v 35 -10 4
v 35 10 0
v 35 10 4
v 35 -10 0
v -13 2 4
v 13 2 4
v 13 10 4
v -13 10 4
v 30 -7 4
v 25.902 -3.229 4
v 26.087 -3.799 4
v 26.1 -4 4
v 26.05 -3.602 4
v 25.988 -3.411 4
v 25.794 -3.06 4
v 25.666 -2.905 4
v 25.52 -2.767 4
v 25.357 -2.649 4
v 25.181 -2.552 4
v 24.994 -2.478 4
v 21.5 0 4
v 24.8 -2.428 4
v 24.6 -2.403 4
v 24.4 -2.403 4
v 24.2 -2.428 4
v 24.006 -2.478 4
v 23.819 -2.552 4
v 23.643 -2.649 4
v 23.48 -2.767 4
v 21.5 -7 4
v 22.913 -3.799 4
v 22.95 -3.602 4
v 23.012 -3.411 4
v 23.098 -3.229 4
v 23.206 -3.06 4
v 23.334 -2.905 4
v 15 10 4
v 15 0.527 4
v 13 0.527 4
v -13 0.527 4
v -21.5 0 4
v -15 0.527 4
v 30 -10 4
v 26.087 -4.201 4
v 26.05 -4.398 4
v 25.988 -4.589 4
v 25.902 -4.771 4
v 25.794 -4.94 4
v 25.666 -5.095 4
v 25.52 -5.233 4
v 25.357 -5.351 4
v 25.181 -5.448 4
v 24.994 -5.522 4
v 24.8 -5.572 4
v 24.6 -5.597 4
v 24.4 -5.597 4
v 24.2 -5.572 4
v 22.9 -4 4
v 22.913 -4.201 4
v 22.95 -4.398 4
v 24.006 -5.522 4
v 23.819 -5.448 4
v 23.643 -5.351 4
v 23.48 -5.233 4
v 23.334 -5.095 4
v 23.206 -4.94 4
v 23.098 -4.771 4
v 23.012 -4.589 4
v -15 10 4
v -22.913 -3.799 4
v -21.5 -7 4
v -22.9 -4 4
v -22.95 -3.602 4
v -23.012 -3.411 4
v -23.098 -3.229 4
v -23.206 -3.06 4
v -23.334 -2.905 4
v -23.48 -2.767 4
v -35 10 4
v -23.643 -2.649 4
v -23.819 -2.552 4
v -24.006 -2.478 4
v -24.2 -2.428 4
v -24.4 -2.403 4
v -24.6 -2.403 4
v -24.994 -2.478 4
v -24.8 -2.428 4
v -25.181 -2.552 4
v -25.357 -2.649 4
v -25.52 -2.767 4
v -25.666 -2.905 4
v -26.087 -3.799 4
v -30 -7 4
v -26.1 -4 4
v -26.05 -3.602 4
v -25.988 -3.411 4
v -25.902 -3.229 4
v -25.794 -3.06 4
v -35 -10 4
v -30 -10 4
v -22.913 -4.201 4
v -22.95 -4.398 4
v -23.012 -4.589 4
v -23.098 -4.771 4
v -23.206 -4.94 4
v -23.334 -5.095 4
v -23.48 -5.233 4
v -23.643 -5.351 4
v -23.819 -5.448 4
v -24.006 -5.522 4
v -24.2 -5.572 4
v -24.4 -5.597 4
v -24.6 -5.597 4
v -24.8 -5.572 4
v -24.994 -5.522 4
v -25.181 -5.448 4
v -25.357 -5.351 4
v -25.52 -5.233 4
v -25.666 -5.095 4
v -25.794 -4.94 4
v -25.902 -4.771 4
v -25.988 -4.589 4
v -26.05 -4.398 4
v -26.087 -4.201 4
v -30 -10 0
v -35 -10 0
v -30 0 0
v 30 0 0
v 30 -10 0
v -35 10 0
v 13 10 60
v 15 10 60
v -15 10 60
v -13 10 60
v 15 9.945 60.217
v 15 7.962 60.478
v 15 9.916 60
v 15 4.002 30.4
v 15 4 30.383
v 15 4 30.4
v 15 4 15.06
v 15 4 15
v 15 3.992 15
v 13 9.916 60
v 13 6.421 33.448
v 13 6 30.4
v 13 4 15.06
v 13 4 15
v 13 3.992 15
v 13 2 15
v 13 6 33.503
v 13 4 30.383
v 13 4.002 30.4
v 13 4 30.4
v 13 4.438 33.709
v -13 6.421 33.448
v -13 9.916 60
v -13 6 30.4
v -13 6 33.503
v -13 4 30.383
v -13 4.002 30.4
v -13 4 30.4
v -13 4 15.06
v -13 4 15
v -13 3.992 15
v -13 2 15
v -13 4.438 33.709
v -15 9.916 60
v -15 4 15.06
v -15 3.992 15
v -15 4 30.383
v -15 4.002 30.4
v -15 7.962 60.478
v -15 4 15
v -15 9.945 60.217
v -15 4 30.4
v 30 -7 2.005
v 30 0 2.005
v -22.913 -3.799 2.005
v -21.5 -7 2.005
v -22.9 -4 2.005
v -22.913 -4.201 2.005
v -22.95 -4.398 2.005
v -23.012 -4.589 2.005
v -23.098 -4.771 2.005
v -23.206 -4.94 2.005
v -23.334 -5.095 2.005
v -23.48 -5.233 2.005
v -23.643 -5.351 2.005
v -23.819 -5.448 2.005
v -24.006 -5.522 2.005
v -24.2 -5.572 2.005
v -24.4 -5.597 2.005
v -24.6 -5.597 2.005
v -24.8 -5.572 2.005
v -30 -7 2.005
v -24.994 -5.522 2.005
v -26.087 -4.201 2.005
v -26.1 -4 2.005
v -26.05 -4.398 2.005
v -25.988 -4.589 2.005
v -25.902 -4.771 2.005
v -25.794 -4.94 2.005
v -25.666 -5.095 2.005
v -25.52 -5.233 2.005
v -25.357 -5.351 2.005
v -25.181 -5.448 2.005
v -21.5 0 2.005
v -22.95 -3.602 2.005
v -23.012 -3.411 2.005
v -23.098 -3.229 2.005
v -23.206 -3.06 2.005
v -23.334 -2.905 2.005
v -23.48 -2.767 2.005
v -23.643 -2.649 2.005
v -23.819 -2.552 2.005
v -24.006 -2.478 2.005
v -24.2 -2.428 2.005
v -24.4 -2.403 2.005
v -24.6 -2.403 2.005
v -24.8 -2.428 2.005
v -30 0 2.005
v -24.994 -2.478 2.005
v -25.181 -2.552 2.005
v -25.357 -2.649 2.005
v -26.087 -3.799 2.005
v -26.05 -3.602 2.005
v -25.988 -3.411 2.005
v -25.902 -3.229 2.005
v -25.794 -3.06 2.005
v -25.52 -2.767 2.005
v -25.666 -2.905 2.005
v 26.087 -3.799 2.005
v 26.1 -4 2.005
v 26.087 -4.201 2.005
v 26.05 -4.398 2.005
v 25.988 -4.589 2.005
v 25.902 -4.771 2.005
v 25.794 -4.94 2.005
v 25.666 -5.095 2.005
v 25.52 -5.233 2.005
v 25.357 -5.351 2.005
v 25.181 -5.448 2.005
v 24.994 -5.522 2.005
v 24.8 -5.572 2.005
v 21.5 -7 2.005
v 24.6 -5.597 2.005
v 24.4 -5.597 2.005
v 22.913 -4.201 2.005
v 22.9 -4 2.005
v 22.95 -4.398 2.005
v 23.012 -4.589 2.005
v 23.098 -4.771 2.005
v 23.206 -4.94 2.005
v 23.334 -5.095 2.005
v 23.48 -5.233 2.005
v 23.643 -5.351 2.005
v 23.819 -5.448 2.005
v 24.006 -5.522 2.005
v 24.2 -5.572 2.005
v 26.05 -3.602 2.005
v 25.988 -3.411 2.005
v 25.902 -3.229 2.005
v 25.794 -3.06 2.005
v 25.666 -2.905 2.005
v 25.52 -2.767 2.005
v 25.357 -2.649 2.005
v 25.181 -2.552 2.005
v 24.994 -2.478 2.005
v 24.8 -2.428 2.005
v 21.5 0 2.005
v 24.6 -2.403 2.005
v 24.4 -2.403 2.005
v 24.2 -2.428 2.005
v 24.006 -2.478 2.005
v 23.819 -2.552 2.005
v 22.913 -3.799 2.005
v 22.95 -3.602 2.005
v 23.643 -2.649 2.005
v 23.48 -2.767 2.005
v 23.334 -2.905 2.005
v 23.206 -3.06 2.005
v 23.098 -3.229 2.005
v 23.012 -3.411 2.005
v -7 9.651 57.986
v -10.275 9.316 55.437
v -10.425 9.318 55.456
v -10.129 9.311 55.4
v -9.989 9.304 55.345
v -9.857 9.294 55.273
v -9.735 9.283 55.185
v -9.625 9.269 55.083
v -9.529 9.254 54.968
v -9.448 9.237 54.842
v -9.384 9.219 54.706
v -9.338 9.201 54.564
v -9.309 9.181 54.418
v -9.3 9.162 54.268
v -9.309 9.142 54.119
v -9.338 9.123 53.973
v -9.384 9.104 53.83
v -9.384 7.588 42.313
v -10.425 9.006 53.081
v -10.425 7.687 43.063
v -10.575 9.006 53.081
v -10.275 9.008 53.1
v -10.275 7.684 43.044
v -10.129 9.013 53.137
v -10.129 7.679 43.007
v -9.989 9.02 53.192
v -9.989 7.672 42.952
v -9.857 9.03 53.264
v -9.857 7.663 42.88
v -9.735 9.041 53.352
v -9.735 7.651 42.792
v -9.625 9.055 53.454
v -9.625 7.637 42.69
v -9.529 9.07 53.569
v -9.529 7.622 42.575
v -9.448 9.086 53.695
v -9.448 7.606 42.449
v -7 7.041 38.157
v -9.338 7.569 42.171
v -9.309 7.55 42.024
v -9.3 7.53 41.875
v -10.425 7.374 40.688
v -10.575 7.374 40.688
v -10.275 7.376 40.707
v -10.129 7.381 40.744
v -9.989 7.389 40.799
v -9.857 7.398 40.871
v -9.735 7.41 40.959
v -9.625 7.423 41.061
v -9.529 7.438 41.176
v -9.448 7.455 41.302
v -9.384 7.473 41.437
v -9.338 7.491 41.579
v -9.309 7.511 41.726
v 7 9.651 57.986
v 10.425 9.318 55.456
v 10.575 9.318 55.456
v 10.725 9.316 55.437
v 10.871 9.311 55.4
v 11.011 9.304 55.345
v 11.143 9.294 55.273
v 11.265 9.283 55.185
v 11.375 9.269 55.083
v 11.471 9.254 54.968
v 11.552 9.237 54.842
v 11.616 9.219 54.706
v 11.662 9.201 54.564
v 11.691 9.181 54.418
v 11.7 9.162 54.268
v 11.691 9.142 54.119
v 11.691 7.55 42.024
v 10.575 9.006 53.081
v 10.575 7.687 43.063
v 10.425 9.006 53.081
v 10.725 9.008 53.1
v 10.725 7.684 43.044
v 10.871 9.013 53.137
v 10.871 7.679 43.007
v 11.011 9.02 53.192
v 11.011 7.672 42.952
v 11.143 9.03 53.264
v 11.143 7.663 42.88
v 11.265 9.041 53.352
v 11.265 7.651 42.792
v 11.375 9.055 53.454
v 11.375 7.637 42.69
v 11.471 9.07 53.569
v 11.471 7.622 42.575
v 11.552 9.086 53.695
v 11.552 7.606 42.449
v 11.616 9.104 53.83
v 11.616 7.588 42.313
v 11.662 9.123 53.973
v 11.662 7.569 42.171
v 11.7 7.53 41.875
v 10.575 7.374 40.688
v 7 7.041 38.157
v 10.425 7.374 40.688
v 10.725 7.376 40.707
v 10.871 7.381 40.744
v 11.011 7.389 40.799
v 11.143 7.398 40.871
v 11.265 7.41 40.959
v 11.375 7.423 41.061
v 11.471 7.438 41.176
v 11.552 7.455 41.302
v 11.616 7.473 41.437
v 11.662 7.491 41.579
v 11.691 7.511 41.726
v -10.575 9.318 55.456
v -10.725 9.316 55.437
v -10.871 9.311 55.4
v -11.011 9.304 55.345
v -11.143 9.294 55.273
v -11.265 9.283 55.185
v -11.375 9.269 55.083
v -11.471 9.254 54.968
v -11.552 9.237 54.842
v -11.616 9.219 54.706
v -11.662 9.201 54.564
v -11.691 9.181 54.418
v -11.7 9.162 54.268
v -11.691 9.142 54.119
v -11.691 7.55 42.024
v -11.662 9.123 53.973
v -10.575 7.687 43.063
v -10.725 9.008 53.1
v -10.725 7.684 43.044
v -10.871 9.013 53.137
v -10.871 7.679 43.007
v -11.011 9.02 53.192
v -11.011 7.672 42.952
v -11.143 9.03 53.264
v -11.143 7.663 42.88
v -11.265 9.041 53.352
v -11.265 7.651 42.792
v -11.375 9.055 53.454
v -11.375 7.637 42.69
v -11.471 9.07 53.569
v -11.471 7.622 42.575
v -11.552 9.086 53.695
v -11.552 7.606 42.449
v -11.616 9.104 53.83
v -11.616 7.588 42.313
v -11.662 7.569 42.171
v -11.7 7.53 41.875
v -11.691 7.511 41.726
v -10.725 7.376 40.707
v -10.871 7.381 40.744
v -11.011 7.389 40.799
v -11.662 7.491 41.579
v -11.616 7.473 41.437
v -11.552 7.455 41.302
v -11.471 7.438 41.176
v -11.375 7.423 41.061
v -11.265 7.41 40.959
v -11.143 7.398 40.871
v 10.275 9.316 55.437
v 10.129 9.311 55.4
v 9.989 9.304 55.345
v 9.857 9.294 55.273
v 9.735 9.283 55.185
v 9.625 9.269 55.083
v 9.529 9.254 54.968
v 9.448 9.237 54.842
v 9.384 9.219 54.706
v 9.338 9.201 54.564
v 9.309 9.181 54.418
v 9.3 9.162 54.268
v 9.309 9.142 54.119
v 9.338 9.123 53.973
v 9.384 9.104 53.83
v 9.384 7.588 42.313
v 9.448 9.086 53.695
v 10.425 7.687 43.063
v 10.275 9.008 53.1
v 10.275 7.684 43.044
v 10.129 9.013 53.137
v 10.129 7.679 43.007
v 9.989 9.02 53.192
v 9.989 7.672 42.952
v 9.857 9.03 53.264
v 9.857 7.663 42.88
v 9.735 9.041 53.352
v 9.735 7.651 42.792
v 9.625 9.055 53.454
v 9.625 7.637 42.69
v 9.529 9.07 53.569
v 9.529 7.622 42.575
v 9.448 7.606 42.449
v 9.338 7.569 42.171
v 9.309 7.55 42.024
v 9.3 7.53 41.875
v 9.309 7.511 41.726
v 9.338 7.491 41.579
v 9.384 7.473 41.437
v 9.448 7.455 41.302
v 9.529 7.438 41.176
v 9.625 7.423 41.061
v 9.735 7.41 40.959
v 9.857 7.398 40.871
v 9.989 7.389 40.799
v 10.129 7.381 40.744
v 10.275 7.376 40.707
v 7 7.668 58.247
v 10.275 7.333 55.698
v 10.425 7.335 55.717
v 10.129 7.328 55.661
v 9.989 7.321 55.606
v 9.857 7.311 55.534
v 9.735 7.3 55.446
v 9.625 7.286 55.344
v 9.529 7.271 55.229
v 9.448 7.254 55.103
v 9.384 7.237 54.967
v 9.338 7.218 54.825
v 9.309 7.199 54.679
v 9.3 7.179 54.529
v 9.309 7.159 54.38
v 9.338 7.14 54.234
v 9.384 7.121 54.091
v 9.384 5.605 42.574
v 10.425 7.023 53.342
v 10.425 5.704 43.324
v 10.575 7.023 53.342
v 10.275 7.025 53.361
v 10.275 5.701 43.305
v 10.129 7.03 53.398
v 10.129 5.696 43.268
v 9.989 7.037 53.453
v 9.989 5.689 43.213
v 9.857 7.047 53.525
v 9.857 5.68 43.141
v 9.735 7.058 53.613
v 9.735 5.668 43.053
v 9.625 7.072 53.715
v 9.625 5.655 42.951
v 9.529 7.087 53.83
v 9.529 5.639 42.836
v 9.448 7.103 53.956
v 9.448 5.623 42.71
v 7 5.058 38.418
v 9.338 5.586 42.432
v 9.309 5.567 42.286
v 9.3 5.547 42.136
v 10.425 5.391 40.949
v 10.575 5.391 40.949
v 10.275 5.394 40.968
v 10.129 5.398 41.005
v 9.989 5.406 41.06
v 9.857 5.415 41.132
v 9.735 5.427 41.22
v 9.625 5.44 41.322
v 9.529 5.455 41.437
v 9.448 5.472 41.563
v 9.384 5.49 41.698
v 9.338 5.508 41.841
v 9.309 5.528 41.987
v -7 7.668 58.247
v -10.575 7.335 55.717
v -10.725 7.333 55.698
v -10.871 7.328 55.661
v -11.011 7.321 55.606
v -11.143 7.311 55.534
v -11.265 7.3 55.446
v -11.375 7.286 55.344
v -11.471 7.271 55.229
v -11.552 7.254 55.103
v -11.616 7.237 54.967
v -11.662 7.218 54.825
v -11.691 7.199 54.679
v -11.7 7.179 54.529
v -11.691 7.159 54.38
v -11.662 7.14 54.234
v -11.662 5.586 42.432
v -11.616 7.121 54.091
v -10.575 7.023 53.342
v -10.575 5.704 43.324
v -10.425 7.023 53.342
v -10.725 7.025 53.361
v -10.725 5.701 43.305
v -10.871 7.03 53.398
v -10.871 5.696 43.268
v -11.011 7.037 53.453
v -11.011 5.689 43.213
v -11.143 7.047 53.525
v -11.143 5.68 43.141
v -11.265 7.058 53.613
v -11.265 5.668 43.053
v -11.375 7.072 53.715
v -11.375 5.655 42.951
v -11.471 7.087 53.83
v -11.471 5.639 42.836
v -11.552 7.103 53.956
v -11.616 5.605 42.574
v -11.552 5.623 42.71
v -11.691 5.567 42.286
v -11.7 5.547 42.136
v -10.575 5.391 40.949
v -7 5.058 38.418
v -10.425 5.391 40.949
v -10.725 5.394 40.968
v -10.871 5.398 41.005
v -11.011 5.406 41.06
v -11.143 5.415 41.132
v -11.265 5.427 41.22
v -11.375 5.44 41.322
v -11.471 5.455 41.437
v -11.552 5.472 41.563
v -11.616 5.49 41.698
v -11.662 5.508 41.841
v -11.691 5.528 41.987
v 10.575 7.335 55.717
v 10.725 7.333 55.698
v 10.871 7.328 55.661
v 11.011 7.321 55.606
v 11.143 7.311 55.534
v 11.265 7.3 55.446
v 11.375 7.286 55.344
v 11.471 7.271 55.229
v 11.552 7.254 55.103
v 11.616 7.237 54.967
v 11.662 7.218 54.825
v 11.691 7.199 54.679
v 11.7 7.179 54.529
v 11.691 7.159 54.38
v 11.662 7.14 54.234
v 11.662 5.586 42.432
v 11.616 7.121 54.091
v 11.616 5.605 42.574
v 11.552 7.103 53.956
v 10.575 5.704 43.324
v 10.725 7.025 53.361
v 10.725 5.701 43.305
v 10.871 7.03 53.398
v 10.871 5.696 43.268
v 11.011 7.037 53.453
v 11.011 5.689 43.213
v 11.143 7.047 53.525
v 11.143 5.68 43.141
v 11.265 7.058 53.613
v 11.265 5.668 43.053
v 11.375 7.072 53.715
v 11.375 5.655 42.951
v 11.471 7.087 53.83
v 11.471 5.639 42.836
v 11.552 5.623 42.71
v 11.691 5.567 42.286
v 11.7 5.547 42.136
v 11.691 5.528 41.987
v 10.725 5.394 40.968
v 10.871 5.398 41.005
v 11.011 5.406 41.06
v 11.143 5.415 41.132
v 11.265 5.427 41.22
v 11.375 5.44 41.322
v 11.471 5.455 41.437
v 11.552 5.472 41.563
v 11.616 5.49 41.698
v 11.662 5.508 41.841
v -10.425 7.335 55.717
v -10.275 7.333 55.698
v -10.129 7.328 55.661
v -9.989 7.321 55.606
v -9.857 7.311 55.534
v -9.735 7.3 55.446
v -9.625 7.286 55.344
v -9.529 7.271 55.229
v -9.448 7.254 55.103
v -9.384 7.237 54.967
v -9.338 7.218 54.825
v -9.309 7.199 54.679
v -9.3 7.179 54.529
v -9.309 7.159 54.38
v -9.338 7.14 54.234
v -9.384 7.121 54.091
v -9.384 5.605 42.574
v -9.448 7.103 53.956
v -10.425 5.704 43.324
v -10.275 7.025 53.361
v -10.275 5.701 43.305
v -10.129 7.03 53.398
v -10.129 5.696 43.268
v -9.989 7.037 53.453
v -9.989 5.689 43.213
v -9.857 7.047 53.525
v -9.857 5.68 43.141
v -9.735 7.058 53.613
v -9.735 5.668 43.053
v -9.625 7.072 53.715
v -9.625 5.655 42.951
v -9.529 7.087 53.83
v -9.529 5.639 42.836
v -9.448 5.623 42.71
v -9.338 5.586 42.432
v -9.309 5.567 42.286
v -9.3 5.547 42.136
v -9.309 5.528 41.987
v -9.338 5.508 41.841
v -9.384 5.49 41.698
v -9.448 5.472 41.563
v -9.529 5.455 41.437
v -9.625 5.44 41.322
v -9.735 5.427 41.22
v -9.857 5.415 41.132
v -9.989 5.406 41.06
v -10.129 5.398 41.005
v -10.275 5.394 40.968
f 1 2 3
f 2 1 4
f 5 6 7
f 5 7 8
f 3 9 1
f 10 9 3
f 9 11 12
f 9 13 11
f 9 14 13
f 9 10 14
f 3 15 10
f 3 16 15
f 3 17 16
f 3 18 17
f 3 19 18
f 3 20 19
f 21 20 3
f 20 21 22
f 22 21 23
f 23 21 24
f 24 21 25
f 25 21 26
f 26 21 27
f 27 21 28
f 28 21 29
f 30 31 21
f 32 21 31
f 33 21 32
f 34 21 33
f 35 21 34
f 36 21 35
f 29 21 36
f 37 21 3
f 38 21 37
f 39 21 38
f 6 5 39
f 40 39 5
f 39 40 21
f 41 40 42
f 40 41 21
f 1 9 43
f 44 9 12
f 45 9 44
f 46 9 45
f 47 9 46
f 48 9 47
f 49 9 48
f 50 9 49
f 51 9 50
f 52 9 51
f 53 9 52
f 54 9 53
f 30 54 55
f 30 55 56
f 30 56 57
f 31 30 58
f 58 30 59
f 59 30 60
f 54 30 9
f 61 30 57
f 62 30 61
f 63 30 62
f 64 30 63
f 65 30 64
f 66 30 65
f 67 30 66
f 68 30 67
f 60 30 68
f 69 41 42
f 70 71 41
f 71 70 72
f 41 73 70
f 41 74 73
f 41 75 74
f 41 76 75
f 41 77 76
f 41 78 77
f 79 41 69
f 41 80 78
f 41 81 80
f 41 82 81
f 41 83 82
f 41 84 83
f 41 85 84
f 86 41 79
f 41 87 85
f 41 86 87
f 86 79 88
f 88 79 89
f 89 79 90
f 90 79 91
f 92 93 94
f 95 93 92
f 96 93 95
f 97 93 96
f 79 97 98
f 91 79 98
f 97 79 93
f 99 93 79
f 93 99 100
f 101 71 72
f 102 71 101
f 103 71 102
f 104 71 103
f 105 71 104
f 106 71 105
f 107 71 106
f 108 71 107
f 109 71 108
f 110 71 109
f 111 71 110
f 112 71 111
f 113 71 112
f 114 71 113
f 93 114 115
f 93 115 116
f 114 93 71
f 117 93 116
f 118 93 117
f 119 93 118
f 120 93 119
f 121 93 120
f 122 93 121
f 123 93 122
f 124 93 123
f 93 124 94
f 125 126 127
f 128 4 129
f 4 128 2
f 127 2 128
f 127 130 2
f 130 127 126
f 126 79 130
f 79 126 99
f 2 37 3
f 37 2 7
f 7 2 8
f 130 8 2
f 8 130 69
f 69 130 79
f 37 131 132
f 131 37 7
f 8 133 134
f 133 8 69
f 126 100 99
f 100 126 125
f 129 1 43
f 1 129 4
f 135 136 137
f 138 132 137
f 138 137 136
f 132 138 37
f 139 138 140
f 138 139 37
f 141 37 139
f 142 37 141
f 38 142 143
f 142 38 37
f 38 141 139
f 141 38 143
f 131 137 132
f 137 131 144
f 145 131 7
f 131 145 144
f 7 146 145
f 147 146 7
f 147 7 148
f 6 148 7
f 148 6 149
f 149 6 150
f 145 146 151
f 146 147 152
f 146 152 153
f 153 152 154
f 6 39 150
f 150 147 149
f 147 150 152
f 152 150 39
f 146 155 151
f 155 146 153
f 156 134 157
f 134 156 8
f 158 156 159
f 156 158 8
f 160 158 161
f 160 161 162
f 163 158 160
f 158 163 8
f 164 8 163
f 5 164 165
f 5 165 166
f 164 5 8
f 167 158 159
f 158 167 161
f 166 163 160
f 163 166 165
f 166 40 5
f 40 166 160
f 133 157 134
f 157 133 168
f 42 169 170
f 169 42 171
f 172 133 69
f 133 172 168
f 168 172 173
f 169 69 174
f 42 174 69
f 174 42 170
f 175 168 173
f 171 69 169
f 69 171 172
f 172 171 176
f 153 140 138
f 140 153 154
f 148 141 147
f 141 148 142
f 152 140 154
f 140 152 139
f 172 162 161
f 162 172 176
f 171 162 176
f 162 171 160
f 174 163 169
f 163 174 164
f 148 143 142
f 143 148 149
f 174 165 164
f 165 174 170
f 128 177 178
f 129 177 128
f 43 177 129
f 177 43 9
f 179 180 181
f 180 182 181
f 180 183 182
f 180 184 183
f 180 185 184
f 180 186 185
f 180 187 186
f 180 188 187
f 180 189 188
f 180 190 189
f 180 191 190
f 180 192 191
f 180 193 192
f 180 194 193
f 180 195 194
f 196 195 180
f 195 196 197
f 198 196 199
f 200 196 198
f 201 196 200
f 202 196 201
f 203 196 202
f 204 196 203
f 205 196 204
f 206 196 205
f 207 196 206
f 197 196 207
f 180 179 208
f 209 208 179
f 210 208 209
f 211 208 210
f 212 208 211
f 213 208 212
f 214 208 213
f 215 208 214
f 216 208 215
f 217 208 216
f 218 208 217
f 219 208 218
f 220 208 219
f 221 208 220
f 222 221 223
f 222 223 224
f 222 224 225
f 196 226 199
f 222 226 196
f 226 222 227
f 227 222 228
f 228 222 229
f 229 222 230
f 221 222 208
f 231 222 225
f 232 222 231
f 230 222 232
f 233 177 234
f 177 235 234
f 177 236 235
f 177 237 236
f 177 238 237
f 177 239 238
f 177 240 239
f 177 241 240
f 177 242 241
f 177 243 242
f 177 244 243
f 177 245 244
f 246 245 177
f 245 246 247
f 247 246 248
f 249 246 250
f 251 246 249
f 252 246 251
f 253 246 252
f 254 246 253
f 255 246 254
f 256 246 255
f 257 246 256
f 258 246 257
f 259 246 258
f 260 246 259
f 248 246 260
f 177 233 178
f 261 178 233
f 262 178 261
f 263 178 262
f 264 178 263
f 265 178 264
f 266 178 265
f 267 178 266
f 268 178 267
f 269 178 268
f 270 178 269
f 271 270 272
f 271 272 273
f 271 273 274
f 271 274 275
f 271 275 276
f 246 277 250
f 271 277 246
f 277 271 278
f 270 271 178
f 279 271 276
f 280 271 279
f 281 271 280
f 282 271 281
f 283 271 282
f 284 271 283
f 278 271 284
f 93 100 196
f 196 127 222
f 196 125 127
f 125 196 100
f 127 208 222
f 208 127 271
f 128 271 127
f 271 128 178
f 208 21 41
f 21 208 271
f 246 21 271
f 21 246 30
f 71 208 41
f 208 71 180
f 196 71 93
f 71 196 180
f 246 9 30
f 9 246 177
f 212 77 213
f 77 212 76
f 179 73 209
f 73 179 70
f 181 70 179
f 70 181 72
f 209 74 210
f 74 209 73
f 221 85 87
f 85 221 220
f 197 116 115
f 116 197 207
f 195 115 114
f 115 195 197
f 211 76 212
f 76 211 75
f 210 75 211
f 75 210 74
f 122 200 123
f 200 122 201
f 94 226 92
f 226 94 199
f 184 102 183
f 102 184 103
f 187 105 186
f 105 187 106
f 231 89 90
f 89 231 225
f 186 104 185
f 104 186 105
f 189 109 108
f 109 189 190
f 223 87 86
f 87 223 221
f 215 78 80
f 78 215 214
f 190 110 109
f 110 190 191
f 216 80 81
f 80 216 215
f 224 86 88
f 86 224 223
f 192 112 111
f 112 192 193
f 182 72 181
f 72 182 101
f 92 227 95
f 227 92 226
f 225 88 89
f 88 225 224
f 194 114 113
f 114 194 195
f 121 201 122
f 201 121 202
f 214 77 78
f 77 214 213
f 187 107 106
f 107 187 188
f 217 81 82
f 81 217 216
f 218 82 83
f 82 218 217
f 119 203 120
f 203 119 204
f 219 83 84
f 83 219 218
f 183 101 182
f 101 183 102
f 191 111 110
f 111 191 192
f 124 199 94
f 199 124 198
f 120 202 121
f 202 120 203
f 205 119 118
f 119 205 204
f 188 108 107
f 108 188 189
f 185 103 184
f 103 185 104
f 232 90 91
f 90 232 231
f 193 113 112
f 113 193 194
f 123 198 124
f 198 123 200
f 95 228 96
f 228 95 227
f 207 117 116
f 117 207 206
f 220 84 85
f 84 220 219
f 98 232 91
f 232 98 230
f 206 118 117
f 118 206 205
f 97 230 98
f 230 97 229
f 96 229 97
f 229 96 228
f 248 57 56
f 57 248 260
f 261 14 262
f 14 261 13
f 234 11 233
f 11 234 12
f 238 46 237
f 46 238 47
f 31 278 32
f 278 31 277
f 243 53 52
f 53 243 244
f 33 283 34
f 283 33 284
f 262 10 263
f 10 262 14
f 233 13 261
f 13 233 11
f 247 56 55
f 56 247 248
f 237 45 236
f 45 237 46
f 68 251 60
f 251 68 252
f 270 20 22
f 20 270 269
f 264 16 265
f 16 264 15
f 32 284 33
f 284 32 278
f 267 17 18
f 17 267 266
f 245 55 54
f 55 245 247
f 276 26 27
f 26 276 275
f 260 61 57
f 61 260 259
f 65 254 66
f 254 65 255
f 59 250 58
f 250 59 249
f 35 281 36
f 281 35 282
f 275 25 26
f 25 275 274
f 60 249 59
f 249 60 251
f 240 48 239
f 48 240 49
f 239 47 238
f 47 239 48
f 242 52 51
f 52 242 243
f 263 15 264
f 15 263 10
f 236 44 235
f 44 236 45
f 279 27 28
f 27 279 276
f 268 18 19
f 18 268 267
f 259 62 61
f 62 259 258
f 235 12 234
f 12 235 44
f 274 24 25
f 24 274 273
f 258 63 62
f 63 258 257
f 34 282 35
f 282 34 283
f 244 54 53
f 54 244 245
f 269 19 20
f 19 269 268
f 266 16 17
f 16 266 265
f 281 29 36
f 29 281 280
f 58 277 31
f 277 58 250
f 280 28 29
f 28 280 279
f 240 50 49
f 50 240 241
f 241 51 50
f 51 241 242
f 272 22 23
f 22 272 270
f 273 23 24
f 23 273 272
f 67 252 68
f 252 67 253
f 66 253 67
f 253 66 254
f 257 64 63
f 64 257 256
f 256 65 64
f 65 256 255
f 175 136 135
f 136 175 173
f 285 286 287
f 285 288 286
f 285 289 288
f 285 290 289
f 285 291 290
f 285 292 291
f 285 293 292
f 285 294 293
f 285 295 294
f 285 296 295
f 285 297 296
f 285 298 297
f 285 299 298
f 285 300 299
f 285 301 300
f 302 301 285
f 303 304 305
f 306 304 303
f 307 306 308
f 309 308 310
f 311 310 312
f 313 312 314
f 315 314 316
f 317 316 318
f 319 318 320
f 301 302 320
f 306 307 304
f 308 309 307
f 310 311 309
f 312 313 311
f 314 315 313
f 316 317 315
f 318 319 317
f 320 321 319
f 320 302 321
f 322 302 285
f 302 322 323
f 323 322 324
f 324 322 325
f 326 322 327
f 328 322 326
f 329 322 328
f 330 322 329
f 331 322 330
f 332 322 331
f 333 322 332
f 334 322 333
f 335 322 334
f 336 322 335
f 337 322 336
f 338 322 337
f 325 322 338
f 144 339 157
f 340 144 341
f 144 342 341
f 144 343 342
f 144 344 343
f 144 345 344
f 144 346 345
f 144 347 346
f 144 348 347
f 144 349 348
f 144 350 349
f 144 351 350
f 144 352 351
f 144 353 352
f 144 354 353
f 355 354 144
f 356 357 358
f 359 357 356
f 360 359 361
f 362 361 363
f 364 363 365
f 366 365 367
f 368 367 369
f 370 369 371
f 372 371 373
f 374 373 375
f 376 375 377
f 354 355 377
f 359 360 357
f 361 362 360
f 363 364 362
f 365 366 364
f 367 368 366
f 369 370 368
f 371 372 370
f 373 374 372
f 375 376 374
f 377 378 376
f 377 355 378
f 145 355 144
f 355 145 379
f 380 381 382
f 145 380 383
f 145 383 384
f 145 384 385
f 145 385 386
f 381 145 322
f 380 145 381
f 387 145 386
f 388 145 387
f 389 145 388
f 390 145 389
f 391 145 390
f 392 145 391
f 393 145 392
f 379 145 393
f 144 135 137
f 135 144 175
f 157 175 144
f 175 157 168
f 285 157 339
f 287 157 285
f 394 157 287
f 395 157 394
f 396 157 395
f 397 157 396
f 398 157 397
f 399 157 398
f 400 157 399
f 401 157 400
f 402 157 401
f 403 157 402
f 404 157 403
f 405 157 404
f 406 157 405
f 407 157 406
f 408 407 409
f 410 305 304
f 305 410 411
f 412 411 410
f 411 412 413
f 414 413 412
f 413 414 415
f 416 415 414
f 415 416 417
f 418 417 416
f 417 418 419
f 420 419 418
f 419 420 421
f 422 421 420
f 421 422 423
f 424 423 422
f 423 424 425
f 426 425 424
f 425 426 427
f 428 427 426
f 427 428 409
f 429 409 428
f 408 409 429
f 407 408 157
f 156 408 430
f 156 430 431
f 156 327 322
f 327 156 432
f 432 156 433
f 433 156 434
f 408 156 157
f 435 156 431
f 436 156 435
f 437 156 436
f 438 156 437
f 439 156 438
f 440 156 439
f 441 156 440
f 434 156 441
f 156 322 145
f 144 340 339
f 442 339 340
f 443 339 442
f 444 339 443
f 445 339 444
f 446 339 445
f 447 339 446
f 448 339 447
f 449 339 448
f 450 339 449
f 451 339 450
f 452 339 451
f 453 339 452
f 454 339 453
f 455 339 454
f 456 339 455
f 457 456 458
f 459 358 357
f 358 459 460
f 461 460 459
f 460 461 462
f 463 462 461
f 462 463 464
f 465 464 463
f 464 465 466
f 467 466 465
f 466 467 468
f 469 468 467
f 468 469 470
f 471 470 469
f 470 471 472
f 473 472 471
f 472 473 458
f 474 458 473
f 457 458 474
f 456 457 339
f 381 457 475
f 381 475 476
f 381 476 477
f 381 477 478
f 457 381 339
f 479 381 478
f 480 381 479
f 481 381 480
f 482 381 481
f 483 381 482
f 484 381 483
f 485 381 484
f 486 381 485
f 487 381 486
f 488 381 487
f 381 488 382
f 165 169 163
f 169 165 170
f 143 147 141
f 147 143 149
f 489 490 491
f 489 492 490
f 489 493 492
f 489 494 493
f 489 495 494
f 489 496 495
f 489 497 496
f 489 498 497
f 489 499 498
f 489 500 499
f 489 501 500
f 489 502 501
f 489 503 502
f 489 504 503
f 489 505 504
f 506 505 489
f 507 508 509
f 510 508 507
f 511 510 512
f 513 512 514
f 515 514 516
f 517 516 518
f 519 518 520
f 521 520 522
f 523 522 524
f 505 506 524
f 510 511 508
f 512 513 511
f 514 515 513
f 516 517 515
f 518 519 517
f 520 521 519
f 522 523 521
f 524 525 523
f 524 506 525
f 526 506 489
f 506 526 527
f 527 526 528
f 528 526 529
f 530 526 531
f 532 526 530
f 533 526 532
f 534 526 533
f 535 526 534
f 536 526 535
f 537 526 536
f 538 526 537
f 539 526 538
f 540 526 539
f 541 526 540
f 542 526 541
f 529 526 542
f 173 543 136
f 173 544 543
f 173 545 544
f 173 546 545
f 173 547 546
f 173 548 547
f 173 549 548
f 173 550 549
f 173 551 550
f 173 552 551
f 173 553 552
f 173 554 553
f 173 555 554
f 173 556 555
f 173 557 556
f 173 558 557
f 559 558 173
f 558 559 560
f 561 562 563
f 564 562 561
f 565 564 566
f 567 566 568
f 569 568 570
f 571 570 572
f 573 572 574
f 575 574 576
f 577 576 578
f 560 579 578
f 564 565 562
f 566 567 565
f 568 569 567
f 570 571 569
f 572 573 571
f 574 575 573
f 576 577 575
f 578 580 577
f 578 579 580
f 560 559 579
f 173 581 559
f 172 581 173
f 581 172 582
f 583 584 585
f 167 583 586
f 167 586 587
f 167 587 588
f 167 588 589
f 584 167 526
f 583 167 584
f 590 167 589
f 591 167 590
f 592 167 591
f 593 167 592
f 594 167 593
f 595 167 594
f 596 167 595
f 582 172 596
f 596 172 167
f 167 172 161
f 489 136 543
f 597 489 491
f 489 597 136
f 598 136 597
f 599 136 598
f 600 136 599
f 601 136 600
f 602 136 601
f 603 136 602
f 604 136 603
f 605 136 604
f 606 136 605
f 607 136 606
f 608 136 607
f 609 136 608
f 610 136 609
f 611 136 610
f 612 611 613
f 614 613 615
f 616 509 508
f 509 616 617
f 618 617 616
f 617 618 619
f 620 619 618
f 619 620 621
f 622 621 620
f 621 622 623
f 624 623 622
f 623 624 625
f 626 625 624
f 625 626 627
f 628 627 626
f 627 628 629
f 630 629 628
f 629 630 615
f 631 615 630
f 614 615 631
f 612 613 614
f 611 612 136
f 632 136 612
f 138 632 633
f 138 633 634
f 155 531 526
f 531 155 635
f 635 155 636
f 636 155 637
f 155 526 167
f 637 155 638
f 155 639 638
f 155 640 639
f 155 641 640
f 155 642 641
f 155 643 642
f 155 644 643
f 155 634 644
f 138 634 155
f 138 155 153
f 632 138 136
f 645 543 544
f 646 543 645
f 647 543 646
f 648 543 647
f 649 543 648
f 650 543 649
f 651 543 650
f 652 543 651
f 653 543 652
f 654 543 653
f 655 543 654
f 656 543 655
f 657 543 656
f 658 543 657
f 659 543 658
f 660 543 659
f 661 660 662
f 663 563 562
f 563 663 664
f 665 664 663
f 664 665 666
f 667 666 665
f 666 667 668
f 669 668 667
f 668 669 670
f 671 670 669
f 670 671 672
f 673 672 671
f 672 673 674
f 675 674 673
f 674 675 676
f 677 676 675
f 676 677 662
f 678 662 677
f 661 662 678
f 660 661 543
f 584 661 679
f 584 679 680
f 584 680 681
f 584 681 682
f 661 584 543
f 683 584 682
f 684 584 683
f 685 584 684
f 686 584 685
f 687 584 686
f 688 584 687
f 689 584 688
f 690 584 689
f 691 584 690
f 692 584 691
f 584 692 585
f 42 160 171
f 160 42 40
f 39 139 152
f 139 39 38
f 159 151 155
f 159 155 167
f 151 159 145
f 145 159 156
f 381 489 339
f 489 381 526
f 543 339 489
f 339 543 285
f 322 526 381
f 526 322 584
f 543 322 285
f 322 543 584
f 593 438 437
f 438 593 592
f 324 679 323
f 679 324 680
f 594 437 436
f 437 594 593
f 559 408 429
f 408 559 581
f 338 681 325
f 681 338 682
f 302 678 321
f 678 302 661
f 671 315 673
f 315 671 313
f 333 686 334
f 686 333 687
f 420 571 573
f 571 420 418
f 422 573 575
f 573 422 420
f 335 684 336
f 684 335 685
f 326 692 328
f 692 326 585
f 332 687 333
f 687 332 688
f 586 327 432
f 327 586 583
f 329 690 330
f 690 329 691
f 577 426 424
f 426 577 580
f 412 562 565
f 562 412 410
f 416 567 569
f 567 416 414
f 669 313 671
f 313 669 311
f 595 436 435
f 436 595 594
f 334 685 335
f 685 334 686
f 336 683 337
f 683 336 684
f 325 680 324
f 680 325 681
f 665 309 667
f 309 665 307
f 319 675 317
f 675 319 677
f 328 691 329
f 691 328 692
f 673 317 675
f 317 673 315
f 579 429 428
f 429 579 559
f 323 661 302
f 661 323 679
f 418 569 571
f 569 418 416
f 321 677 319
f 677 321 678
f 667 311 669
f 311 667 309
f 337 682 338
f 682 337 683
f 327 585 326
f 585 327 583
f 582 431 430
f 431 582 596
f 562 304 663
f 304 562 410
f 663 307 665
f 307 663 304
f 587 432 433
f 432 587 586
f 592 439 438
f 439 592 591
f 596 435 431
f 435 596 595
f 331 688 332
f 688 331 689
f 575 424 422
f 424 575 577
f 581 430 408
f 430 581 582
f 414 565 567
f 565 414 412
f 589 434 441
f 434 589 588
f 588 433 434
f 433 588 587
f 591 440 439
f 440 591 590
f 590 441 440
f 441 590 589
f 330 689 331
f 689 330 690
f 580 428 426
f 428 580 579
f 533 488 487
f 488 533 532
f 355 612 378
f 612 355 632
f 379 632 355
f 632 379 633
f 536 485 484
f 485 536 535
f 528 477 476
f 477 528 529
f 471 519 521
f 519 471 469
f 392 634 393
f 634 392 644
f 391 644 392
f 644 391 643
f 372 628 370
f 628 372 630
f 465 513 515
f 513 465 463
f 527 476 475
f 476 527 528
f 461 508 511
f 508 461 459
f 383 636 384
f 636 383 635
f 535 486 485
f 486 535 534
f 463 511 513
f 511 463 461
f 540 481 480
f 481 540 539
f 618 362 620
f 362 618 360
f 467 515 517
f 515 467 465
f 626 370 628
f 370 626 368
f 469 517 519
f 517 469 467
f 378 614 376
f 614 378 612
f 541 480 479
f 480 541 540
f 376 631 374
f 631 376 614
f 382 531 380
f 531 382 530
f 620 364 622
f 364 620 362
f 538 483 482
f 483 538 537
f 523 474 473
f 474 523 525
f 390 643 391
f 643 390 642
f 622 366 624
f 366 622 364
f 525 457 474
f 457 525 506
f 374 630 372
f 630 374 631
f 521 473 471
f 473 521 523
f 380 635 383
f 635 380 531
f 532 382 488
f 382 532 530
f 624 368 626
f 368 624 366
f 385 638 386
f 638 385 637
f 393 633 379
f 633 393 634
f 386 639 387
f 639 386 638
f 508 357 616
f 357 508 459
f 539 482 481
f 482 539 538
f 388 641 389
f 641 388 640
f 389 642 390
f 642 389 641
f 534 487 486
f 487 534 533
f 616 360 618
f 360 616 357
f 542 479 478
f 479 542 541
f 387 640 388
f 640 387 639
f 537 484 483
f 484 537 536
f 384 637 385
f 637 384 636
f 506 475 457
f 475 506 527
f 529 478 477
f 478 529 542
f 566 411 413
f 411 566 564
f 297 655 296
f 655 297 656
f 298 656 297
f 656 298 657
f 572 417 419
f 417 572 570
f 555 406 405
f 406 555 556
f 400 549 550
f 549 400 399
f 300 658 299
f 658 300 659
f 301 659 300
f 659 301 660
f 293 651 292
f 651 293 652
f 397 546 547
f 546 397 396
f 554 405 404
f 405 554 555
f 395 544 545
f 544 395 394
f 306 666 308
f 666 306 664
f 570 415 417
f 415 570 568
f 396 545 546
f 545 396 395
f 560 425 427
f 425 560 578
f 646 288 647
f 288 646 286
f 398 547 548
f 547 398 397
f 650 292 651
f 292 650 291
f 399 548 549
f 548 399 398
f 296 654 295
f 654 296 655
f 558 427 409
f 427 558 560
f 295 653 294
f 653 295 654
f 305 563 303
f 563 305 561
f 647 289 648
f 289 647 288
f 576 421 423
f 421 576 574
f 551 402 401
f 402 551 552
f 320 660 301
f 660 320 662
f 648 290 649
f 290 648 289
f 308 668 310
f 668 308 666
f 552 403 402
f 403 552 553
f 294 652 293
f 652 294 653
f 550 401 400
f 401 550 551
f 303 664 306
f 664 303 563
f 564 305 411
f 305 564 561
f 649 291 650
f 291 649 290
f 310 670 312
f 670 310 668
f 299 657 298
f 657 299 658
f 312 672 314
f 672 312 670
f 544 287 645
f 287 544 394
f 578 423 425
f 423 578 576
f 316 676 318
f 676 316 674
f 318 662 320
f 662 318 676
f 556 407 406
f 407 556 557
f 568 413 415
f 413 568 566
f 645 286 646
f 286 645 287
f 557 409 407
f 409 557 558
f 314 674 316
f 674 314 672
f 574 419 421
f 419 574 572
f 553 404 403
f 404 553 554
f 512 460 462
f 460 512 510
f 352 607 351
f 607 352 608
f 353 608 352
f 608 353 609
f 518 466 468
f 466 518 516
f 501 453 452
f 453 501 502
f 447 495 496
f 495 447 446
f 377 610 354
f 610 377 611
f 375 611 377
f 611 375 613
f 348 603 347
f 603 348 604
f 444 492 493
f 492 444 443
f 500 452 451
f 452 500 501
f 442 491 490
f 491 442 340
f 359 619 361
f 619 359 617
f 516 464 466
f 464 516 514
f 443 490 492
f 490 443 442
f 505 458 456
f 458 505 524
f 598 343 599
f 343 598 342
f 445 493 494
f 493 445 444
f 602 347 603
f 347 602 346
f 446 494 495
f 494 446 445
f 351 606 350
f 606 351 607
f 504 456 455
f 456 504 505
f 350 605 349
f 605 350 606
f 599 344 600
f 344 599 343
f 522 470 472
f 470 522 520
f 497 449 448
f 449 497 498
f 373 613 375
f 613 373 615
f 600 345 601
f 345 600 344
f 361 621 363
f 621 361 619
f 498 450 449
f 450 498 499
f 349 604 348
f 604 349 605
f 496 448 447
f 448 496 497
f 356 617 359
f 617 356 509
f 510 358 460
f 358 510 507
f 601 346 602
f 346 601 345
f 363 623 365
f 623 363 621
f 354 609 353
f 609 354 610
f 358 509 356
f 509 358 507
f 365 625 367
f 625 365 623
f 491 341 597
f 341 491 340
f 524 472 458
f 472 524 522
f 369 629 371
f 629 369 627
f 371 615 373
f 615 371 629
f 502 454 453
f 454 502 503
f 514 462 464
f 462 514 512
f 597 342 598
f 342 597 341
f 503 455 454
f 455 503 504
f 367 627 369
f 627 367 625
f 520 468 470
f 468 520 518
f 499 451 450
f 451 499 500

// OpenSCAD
module bottom(){
difference(){
    union(){
        translate([0,0, 4/2])cube([70,20,4],center=true);
        translate([ 14,10-2/2, 60/2])cube([2,2,60],center=true);
        translate([-14,10-2/2, 60/2])cube([2,2,60],center=true);
        translate([ 14,8-2/2, 45.5/2])cube([2,2,45.5],center=true);
        translate([-14,8-2/2, 45.5/2])cube([2,2,45.5],center=true);
        translate([ 14,6-2/2, 30.4/2])cube([2,2,30.4],center=true);
        translate([-14,6-2/2, 30.4/2])cube([2,2,30.4],center=true);
        translate([ 14,4-2/2, 15/2])cube([2,2,15],center=true);
        translate([-14,4-2/2, 15/2])cube([2,2,15],center=true);
    }

    //rpi
    translate([ 0, (-4-62)/2, 2/2])cube([60,65+1,2.01],center=true);
    translate([ 0, (-4-62)/2,0])cube([43,66,100],center=true);
    translate([ 0, (-4-62)/2,0])cube([60,52,100],center=true);

    //screw
    translate([-24.5, -4,0])cylinder(110, r=1.6,center=true,$fn=50);
    translate([ 24.5, -4,0])cylinder(110, r=1.6,center=true,$fn=50);
}
}

module upper(){
difference(){
    union(){
        translate([0,1, 1+60/2])cube([30,2,60],center=true);
    }

    //camera
    translate([0,0, 4+30/2])cube([26,10,30],center=true);
    translate([0,0, 55-12.5/2])cube([14,10,20],center=true);
    translate([-21/2,0,55-12.5])rotate([90,0,0])cylinder(110, r=1.2,center=true,$fn=50);
    translate([ 21/2,0,55-12.5])rotate([90,0,0])cylinder(110, r=1.2,center=true,$fn=50);
    translate([-21/2,0,55])rotate([90,0,0])cylinder(110, r=1.2,center=true,$fn=50);
    translate([ 21/2,0,55])rotate([90,0,0])cylinder(110, r=1.2,center=true,$fn=50);
}
}


bottom();
rotate([-7.5,0,0])upper();
